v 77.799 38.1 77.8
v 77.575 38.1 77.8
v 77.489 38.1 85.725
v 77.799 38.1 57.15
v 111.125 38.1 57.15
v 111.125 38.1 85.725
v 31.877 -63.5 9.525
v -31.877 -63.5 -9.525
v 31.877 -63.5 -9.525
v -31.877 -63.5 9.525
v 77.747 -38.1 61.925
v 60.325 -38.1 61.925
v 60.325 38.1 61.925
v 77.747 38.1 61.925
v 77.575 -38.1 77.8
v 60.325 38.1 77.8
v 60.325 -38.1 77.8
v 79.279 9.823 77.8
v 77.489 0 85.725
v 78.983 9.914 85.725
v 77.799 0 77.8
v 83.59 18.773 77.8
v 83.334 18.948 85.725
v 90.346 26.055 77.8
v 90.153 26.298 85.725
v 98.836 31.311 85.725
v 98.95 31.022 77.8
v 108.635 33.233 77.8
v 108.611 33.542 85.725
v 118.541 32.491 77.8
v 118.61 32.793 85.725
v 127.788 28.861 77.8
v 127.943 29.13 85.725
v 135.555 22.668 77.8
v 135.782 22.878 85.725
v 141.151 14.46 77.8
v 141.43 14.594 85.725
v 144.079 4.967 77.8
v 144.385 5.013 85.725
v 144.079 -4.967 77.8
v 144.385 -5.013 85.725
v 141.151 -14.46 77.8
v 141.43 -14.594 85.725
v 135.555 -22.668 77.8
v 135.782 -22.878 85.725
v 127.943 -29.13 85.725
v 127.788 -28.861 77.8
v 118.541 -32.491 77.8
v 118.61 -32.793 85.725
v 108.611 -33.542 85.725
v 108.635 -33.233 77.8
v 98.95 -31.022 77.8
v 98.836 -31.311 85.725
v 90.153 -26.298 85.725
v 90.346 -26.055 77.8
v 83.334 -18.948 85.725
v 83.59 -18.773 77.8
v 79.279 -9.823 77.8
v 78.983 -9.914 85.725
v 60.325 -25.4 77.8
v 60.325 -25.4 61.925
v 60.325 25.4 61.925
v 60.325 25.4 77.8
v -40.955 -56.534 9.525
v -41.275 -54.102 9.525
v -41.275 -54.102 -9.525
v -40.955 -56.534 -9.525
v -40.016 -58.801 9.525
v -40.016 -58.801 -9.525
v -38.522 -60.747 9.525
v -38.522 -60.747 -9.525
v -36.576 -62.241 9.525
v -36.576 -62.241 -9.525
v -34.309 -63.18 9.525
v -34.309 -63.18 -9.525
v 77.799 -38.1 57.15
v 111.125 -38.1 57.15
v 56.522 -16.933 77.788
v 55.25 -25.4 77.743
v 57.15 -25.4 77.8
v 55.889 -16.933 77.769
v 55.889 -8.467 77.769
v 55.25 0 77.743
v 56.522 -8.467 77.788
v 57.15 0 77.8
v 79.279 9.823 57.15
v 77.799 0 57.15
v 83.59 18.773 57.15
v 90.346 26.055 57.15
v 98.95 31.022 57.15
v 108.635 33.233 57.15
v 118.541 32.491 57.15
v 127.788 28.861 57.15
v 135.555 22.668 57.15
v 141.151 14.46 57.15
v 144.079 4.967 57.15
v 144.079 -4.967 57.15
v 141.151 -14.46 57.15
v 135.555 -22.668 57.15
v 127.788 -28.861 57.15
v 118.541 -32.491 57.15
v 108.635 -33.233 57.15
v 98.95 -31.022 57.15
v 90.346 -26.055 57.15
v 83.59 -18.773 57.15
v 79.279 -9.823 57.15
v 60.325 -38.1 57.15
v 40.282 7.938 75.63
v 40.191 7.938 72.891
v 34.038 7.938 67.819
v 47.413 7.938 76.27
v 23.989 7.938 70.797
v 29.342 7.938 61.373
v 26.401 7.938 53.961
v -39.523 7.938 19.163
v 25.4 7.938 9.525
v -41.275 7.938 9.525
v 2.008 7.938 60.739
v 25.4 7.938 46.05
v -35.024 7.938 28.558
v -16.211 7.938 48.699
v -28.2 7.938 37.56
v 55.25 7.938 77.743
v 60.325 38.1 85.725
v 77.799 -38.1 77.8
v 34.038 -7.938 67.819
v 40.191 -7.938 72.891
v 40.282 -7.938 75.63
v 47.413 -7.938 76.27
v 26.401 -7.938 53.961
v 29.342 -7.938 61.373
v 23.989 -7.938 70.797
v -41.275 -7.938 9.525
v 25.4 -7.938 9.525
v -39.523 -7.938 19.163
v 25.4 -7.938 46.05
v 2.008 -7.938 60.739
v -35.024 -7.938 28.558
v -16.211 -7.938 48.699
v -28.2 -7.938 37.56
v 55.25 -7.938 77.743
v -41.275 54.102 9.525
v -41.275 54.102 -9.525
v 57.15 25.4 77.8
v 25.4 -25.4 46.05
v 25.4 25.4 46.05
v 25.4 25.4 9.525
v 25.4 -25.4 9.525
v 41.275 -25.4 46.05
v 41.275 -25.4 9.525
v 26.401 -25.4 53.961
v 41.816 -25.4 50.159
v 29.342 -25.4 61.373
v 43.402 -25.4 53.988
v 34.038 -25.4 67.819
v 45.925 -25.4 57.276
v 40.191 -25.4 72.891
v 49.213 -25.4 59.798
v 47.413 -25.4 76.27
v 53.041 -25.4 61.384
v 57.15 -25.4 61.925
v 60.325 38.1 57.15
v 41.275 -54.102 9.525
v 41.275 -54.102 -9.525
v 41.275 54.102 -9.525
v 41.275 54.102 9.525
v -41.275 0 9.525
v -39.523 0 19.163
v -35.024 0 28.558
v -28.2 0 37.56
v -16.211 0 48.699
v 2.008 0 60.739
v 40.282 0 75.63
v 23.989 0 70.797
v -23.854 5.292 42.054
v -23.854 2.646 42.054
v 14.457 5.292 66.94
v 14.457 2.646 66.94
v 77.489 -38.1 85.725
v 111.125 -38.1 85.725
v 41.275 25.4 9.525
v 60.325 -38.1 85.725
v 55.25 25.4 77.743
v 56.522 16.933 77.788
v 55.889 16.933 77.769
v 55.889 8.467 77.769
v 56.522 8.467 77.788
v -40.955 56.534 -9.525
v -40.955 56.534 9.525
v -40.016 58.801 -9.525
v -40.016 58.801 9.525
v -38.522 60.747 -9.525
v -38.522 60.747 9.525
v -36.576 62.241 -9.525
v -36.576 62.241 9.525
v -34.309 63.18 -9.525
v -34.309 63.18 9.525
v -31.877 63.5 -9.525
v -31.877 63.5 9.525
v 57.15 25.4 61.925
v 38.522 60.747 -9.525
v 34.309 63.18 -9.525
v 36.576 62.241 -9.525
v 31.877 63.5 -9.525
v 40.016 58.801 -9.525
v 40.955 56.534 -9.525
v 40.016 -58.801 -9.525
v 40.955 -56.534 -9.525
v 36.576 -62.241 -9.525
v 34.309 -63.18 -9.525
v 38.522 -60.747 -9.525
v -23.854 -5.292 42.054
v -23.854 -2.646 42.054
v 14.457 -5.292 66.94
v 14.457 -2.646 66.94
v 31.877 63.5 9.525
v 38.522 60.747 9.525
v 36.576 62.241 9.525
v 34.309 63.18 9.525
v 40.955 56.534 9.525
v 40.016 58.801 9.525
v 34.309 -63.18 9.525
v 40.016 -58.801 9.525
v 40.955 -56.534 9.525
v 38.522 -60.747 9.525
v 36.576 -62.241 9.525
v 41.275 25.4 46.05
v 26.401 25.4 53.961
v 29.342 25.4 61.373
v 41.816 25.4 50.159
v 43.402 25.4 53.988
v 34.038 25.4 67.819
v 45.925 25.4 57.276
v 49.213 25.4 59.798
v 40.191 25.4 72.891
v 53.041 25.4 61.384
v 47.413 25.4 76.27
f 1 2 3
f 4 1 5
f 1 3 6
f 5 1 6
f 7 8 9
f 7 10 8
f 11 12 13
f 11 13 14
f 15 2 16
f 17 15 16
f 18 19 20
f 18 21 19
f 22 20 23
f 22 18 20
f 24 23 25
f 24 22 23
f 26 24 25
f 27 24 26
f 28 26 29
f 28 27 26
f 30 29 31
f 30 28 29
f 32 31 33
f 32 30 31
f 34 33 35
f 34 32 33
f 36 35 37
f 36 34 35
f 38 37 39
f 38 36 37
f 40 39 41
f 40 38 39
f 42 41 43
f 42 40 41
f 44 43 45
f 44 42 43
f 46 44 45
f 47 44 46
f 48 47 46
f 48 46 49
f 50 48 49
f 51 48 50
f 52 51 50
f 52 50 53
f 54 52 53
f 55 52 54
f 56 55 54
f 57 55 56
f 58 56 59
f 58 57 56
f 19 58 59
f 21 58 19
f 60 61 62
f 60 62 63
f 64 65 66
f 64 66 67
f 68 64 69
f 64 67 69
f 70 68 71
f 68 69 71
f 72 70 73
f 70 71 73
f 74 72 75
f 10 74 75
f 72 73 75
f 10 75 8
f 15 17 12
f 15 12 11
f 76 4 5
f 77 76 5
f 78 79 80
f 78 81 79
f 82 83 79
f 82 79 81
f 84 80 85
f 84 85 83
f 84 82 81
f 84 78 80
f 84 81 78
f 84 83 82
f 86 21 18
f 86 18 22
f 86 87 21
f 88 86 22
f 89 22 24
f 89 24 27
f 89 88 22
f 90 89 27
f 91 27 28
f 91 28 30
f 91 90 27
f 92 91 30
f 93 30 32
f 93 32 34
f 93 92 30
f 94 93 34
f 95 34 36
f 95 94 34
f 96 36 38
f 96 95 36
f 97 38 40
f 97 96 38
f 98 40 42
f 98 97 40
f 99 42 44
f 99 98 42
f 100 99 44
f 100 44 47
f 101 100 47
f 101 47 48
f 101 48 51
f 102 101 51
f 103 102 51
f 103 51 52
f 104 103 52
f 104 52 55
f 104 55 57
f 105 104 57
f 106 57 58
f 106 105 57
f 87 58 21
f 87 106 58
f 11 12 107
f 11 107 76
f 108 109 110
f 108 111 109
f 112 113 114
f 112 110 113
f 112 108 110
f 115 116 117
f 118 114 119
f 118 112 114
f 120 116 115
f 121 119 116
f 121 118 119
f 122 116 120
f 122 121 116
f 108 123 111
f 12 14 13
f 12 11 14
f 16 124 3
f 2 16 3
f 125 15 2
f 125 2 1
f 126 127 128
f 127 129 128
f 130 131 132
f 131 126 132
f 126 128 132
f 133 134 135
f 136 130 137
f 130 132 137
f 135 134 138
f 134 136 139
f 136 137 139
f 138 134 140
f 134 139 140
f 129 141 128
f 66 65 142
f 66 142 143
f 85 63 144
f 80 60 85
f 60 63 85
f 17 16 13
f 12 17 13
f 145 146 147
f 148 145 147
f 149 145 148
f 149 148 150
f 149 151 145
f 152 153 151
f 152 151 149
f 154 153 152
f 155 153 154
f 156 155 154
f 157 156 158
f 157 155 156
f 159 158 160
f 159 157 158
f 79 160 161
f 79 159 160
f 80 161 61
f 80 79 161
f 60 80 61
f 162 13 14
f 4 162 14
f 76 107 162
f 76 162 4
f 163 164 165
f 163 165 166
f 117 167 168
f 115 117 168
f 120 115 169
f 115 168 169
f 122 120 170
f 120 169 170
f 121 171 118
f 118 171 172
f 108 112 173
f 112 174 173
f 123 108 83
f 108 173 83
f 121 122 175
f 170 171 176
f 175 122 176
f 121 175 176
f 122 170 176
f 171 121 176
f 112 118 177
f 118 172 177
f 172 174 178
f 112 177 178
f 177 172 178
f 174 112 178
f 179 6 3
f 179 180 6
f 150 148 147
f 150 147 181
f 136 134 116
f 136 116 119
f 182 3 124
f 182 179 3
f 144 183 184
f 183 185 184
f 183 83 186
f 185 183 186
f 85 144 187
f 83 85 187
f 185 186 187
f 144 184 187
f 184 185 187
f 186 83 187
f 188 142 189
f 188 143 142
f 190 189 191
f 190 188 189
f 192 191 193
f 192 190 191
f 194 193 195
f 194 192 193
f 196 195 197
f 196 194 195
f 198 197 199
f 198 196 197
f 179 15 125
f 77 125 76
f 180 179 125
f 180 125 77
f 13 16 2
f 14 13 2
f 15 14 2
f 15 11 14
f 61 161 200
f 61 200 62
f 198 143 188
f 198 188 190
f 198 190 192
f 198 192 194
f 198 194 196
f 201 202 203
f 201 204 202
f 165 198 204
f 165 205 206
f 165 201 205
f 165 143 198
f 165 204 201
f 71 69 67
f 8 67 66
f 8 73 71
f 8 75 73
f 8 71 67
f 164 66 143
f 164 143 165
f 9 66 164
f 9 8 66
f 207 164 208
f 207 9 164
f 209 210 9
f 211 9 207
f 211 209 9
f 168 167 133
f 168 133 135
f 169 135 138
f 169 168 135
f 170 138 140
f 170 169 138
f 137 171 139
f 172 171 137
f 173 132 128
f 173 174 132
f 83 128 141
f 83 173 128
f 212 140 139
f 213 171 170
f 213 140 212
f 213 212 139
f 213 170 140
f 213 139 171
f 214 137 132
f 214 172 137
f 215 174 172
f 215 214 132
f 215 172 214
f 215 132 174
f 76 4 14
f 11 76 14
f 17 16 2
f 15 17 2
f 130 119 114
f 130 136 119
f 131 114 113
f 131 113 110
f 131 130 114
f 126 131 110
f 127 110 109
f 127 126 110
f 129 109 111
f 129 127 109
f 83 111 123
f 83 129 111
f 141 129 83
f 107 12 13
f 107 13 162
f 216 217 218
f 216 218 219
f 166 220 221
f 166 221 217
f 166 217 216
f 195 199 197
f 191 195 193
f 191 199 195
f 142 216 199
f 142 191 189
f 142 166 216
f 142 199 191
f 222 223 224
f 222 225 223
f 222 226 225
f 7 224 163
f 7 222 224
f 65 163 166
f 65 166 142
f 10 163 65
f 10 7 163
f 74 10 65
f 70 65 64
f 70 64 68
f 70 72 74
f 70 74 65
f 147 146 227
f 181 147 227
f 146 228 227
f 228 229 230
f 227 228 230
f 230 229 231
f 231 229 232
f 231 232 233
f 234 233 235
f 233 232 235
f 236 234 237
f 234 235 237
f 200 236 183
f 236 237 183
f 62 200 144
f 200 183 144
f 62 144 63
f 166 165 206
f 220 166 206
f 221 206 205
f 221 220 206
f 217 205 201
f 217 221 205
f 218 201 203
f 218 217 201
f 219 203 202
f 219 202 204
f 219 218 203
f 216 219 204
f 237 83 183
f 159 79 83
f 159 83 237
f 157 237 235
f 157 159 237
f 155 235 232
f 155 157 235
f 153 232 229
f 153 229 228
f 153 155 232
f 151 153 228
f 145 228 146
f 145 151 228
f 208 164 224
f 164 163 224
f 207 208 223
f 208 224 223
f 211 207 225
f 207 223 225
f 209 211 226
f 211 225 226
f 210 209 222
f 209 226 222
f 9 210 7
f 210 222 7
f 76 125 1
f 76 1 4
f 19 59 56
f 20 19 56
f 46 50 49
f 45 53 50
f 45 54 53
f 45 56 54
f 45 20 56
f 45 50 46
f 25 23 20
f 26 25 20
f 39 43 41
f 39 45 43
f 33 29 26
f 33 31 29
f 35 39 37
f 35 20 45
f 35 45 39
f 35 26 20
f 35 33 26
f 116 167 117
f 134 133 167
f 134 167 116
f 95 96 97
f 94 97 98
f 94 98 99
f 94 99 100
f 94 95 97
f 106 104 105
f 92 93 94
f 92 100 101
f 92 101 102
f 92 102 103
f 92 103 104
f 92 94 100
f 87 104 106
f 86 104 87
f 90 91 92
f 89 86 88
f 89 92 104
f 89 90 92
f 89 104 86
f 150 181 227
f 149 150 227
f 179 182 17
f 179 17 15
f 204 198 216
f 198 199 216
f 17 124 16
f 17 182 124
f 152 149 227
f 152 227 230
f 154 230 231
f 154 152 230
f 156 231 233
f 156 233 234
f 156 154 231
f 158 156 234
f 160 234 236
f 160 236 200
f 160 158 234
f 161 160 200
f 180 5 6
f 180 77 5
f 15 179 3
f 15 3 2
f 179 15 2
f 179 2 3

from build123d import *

# Parameters (mm, degrees)
F1_DEPTH = 63.5
F2_DEPTH = 25.4
F3_DEPTH = 38.1
F4_DEPTH = 38.1
F6_DEPTH = 7.9375
F7_DEPTH = 38.1
F8_R     = 9.398


with BuildPart() as f1:
    # F0 (on Front) → F1 (new body, symmetric)
    with BuildSketch(Plane.XZ):
        Polygon((25.4, 9.525), (-41.275, 9.525), (-41.275, -9.525), (41.275, -9.525), (41.275, 9.525), align=None)
    extrude(amount=F1_DEPTH, both=True)

    # F8
    f8_edges = [f1.edges().sort_by_distance(p)[0] for p in [
        (-41.275, -63.5, 0),
        (41.275, -63.5, 0),
        (-41.275, 63.5, 0),
        (41.275, 63.5, 0),
    ]]
    fillet(f8_edges, radius=F8_R)


with BuildPart() as f2:
    # F0 (on Front) → F2 (new body, symmetric)
    with BuildSketch(Plane.XZ):
        with BuildLine():
            Line((25.4, 46.0502), (25.4, 9.525))
            Line((25.4, 9.525), (41.275, 9.525))
            Line((41.275, 9.525), (41.275, 46.0502))
            ThreePointArc((41.275, 46.0502), (45.9246798487, 57.2755201513), (57.15, 61.9252))
            Line((57.15, 61.9252), (60.325, 61.9252))
            Line((60.325, 61.9252), (60.325, 77.8002))
            Line((60.325, 77.8002), (57.15, 77.8002))
            add(Edge.make_bspline(
                [(55.2503842192, 77.7433216494), (55.8913637683, 77.7721512684), (56.5247262294, 77.7911657134), (57.15, 77.8002)],
                knots=[117.6858667866, 117.6858667866, 117.6858667866, 117.6858667866, 119.7872428936, 119.7872428936, 119.7872428936, 119.7872428936], degree=3))
            ThreePointArc((55.2503842192, 77.7433216494), (34.0375001239, 67.8188666904), (25.4, 46.0502))
        make_face()
    extrude(amount=F2_DEPTH, both=True)


with BuildPart() as f3:
    # F0 (on Front) → F3 (new body, symmetric)
    with BuildSketch(Plane.XZ):
        Polygon((111.125, 85.725), (77.4890035391, 85.725), (77.7988448334, 77.8002), (77.7988448334, 61.9252), (77.7988448334, 57.15), (111.125, 57.15), align=None)
        Polygon((77.4890035391, 85.725), (77.574932858, 77.8002), (77.7988448334, 77.8002), align=None)
    extrude(amount=F3_DEPTH, both=True)


with BuildPart() as f3b:
    # F0 (on Front) → F3, piece 2 (new body, symmetric)
    with BuildSketch(Plane.XZ):
        Polygon((77.574932858, 77.8002), (60.325, 77.8002), (60.325, 61.9252), (77.7470669104, 61.9252), align=None)
    extrude(amount=F3_DEPTH, both=True)


with BuildPart() as f4:
    # F0 (on Front) → F4 (new body, symmetric)
    with BuildSketch(Plane.XZ):
        Polygon((77.7470669104, 61.9252), (60.325, 61.9252), (60.325, 57.15), (77.7988448334, 57.15), align=None)
    extrude(amount=F4_DEPTH, both=True)


with BuildPart() as f5:
    # F0 (on Front) → F5 (revolve)
    with BuildSketch(Plane.XZ):
        Polygon((111.125, 85.725), (77.4890035391, 85.725), (77.7988448334, 77.8002), (77.7988448334, 61.9252), (77.7988448334, 57.15), (111.125, 57.15), align=None)
    revolve(axis=Axis((111.125, 0, 71.4375), (0, 0, -1)))


with BuildPart() as f6:
    # F0 (on Front) → F6 (new body, symmetric)
    with BuildSketch(Plane.XZ):
        with BuildLine():
            add(Edge.make_bspline(
                [(-41.275, 9.525), (-40.4354595684, 43.7291708073), (19.3528437533, 76.1287421905), (55.2503842192, 77.7433216494)],
                knots=[0, 0, 0, 0, 117.6858667866, 117.6858667866, 117.6858667866, 117.6858667866], degree=3))
            Line((-41.275, 9.525), (25.4, 9.525))
            Line((25.4, 9.525), (25.4, 46.0502))
            ThreePointArc((25.4, 46.0502), (34.0375001239, 67.8188666904), (55.2503842192, 77.7433216494))
        make_face()
    extrude(amount=F6_DEPTH, both=True)


with BuildPart() as f7:
    # F0 (on Front) → F7 (new body, symmetric)
    with BuildSketch(Plane.XZ):
        Polygon((60.325, 85.725), (60.325, 77.8002), (77.574932858, 77.8002), (77.4890035391, 85.725), align=None)
    extrude(amount=F7_DEPTH, both=True)


solid = Compound([f1.part, f2.part, f3.part, f3b.part, f4.part, f5.part, f6.part, f7.part])
